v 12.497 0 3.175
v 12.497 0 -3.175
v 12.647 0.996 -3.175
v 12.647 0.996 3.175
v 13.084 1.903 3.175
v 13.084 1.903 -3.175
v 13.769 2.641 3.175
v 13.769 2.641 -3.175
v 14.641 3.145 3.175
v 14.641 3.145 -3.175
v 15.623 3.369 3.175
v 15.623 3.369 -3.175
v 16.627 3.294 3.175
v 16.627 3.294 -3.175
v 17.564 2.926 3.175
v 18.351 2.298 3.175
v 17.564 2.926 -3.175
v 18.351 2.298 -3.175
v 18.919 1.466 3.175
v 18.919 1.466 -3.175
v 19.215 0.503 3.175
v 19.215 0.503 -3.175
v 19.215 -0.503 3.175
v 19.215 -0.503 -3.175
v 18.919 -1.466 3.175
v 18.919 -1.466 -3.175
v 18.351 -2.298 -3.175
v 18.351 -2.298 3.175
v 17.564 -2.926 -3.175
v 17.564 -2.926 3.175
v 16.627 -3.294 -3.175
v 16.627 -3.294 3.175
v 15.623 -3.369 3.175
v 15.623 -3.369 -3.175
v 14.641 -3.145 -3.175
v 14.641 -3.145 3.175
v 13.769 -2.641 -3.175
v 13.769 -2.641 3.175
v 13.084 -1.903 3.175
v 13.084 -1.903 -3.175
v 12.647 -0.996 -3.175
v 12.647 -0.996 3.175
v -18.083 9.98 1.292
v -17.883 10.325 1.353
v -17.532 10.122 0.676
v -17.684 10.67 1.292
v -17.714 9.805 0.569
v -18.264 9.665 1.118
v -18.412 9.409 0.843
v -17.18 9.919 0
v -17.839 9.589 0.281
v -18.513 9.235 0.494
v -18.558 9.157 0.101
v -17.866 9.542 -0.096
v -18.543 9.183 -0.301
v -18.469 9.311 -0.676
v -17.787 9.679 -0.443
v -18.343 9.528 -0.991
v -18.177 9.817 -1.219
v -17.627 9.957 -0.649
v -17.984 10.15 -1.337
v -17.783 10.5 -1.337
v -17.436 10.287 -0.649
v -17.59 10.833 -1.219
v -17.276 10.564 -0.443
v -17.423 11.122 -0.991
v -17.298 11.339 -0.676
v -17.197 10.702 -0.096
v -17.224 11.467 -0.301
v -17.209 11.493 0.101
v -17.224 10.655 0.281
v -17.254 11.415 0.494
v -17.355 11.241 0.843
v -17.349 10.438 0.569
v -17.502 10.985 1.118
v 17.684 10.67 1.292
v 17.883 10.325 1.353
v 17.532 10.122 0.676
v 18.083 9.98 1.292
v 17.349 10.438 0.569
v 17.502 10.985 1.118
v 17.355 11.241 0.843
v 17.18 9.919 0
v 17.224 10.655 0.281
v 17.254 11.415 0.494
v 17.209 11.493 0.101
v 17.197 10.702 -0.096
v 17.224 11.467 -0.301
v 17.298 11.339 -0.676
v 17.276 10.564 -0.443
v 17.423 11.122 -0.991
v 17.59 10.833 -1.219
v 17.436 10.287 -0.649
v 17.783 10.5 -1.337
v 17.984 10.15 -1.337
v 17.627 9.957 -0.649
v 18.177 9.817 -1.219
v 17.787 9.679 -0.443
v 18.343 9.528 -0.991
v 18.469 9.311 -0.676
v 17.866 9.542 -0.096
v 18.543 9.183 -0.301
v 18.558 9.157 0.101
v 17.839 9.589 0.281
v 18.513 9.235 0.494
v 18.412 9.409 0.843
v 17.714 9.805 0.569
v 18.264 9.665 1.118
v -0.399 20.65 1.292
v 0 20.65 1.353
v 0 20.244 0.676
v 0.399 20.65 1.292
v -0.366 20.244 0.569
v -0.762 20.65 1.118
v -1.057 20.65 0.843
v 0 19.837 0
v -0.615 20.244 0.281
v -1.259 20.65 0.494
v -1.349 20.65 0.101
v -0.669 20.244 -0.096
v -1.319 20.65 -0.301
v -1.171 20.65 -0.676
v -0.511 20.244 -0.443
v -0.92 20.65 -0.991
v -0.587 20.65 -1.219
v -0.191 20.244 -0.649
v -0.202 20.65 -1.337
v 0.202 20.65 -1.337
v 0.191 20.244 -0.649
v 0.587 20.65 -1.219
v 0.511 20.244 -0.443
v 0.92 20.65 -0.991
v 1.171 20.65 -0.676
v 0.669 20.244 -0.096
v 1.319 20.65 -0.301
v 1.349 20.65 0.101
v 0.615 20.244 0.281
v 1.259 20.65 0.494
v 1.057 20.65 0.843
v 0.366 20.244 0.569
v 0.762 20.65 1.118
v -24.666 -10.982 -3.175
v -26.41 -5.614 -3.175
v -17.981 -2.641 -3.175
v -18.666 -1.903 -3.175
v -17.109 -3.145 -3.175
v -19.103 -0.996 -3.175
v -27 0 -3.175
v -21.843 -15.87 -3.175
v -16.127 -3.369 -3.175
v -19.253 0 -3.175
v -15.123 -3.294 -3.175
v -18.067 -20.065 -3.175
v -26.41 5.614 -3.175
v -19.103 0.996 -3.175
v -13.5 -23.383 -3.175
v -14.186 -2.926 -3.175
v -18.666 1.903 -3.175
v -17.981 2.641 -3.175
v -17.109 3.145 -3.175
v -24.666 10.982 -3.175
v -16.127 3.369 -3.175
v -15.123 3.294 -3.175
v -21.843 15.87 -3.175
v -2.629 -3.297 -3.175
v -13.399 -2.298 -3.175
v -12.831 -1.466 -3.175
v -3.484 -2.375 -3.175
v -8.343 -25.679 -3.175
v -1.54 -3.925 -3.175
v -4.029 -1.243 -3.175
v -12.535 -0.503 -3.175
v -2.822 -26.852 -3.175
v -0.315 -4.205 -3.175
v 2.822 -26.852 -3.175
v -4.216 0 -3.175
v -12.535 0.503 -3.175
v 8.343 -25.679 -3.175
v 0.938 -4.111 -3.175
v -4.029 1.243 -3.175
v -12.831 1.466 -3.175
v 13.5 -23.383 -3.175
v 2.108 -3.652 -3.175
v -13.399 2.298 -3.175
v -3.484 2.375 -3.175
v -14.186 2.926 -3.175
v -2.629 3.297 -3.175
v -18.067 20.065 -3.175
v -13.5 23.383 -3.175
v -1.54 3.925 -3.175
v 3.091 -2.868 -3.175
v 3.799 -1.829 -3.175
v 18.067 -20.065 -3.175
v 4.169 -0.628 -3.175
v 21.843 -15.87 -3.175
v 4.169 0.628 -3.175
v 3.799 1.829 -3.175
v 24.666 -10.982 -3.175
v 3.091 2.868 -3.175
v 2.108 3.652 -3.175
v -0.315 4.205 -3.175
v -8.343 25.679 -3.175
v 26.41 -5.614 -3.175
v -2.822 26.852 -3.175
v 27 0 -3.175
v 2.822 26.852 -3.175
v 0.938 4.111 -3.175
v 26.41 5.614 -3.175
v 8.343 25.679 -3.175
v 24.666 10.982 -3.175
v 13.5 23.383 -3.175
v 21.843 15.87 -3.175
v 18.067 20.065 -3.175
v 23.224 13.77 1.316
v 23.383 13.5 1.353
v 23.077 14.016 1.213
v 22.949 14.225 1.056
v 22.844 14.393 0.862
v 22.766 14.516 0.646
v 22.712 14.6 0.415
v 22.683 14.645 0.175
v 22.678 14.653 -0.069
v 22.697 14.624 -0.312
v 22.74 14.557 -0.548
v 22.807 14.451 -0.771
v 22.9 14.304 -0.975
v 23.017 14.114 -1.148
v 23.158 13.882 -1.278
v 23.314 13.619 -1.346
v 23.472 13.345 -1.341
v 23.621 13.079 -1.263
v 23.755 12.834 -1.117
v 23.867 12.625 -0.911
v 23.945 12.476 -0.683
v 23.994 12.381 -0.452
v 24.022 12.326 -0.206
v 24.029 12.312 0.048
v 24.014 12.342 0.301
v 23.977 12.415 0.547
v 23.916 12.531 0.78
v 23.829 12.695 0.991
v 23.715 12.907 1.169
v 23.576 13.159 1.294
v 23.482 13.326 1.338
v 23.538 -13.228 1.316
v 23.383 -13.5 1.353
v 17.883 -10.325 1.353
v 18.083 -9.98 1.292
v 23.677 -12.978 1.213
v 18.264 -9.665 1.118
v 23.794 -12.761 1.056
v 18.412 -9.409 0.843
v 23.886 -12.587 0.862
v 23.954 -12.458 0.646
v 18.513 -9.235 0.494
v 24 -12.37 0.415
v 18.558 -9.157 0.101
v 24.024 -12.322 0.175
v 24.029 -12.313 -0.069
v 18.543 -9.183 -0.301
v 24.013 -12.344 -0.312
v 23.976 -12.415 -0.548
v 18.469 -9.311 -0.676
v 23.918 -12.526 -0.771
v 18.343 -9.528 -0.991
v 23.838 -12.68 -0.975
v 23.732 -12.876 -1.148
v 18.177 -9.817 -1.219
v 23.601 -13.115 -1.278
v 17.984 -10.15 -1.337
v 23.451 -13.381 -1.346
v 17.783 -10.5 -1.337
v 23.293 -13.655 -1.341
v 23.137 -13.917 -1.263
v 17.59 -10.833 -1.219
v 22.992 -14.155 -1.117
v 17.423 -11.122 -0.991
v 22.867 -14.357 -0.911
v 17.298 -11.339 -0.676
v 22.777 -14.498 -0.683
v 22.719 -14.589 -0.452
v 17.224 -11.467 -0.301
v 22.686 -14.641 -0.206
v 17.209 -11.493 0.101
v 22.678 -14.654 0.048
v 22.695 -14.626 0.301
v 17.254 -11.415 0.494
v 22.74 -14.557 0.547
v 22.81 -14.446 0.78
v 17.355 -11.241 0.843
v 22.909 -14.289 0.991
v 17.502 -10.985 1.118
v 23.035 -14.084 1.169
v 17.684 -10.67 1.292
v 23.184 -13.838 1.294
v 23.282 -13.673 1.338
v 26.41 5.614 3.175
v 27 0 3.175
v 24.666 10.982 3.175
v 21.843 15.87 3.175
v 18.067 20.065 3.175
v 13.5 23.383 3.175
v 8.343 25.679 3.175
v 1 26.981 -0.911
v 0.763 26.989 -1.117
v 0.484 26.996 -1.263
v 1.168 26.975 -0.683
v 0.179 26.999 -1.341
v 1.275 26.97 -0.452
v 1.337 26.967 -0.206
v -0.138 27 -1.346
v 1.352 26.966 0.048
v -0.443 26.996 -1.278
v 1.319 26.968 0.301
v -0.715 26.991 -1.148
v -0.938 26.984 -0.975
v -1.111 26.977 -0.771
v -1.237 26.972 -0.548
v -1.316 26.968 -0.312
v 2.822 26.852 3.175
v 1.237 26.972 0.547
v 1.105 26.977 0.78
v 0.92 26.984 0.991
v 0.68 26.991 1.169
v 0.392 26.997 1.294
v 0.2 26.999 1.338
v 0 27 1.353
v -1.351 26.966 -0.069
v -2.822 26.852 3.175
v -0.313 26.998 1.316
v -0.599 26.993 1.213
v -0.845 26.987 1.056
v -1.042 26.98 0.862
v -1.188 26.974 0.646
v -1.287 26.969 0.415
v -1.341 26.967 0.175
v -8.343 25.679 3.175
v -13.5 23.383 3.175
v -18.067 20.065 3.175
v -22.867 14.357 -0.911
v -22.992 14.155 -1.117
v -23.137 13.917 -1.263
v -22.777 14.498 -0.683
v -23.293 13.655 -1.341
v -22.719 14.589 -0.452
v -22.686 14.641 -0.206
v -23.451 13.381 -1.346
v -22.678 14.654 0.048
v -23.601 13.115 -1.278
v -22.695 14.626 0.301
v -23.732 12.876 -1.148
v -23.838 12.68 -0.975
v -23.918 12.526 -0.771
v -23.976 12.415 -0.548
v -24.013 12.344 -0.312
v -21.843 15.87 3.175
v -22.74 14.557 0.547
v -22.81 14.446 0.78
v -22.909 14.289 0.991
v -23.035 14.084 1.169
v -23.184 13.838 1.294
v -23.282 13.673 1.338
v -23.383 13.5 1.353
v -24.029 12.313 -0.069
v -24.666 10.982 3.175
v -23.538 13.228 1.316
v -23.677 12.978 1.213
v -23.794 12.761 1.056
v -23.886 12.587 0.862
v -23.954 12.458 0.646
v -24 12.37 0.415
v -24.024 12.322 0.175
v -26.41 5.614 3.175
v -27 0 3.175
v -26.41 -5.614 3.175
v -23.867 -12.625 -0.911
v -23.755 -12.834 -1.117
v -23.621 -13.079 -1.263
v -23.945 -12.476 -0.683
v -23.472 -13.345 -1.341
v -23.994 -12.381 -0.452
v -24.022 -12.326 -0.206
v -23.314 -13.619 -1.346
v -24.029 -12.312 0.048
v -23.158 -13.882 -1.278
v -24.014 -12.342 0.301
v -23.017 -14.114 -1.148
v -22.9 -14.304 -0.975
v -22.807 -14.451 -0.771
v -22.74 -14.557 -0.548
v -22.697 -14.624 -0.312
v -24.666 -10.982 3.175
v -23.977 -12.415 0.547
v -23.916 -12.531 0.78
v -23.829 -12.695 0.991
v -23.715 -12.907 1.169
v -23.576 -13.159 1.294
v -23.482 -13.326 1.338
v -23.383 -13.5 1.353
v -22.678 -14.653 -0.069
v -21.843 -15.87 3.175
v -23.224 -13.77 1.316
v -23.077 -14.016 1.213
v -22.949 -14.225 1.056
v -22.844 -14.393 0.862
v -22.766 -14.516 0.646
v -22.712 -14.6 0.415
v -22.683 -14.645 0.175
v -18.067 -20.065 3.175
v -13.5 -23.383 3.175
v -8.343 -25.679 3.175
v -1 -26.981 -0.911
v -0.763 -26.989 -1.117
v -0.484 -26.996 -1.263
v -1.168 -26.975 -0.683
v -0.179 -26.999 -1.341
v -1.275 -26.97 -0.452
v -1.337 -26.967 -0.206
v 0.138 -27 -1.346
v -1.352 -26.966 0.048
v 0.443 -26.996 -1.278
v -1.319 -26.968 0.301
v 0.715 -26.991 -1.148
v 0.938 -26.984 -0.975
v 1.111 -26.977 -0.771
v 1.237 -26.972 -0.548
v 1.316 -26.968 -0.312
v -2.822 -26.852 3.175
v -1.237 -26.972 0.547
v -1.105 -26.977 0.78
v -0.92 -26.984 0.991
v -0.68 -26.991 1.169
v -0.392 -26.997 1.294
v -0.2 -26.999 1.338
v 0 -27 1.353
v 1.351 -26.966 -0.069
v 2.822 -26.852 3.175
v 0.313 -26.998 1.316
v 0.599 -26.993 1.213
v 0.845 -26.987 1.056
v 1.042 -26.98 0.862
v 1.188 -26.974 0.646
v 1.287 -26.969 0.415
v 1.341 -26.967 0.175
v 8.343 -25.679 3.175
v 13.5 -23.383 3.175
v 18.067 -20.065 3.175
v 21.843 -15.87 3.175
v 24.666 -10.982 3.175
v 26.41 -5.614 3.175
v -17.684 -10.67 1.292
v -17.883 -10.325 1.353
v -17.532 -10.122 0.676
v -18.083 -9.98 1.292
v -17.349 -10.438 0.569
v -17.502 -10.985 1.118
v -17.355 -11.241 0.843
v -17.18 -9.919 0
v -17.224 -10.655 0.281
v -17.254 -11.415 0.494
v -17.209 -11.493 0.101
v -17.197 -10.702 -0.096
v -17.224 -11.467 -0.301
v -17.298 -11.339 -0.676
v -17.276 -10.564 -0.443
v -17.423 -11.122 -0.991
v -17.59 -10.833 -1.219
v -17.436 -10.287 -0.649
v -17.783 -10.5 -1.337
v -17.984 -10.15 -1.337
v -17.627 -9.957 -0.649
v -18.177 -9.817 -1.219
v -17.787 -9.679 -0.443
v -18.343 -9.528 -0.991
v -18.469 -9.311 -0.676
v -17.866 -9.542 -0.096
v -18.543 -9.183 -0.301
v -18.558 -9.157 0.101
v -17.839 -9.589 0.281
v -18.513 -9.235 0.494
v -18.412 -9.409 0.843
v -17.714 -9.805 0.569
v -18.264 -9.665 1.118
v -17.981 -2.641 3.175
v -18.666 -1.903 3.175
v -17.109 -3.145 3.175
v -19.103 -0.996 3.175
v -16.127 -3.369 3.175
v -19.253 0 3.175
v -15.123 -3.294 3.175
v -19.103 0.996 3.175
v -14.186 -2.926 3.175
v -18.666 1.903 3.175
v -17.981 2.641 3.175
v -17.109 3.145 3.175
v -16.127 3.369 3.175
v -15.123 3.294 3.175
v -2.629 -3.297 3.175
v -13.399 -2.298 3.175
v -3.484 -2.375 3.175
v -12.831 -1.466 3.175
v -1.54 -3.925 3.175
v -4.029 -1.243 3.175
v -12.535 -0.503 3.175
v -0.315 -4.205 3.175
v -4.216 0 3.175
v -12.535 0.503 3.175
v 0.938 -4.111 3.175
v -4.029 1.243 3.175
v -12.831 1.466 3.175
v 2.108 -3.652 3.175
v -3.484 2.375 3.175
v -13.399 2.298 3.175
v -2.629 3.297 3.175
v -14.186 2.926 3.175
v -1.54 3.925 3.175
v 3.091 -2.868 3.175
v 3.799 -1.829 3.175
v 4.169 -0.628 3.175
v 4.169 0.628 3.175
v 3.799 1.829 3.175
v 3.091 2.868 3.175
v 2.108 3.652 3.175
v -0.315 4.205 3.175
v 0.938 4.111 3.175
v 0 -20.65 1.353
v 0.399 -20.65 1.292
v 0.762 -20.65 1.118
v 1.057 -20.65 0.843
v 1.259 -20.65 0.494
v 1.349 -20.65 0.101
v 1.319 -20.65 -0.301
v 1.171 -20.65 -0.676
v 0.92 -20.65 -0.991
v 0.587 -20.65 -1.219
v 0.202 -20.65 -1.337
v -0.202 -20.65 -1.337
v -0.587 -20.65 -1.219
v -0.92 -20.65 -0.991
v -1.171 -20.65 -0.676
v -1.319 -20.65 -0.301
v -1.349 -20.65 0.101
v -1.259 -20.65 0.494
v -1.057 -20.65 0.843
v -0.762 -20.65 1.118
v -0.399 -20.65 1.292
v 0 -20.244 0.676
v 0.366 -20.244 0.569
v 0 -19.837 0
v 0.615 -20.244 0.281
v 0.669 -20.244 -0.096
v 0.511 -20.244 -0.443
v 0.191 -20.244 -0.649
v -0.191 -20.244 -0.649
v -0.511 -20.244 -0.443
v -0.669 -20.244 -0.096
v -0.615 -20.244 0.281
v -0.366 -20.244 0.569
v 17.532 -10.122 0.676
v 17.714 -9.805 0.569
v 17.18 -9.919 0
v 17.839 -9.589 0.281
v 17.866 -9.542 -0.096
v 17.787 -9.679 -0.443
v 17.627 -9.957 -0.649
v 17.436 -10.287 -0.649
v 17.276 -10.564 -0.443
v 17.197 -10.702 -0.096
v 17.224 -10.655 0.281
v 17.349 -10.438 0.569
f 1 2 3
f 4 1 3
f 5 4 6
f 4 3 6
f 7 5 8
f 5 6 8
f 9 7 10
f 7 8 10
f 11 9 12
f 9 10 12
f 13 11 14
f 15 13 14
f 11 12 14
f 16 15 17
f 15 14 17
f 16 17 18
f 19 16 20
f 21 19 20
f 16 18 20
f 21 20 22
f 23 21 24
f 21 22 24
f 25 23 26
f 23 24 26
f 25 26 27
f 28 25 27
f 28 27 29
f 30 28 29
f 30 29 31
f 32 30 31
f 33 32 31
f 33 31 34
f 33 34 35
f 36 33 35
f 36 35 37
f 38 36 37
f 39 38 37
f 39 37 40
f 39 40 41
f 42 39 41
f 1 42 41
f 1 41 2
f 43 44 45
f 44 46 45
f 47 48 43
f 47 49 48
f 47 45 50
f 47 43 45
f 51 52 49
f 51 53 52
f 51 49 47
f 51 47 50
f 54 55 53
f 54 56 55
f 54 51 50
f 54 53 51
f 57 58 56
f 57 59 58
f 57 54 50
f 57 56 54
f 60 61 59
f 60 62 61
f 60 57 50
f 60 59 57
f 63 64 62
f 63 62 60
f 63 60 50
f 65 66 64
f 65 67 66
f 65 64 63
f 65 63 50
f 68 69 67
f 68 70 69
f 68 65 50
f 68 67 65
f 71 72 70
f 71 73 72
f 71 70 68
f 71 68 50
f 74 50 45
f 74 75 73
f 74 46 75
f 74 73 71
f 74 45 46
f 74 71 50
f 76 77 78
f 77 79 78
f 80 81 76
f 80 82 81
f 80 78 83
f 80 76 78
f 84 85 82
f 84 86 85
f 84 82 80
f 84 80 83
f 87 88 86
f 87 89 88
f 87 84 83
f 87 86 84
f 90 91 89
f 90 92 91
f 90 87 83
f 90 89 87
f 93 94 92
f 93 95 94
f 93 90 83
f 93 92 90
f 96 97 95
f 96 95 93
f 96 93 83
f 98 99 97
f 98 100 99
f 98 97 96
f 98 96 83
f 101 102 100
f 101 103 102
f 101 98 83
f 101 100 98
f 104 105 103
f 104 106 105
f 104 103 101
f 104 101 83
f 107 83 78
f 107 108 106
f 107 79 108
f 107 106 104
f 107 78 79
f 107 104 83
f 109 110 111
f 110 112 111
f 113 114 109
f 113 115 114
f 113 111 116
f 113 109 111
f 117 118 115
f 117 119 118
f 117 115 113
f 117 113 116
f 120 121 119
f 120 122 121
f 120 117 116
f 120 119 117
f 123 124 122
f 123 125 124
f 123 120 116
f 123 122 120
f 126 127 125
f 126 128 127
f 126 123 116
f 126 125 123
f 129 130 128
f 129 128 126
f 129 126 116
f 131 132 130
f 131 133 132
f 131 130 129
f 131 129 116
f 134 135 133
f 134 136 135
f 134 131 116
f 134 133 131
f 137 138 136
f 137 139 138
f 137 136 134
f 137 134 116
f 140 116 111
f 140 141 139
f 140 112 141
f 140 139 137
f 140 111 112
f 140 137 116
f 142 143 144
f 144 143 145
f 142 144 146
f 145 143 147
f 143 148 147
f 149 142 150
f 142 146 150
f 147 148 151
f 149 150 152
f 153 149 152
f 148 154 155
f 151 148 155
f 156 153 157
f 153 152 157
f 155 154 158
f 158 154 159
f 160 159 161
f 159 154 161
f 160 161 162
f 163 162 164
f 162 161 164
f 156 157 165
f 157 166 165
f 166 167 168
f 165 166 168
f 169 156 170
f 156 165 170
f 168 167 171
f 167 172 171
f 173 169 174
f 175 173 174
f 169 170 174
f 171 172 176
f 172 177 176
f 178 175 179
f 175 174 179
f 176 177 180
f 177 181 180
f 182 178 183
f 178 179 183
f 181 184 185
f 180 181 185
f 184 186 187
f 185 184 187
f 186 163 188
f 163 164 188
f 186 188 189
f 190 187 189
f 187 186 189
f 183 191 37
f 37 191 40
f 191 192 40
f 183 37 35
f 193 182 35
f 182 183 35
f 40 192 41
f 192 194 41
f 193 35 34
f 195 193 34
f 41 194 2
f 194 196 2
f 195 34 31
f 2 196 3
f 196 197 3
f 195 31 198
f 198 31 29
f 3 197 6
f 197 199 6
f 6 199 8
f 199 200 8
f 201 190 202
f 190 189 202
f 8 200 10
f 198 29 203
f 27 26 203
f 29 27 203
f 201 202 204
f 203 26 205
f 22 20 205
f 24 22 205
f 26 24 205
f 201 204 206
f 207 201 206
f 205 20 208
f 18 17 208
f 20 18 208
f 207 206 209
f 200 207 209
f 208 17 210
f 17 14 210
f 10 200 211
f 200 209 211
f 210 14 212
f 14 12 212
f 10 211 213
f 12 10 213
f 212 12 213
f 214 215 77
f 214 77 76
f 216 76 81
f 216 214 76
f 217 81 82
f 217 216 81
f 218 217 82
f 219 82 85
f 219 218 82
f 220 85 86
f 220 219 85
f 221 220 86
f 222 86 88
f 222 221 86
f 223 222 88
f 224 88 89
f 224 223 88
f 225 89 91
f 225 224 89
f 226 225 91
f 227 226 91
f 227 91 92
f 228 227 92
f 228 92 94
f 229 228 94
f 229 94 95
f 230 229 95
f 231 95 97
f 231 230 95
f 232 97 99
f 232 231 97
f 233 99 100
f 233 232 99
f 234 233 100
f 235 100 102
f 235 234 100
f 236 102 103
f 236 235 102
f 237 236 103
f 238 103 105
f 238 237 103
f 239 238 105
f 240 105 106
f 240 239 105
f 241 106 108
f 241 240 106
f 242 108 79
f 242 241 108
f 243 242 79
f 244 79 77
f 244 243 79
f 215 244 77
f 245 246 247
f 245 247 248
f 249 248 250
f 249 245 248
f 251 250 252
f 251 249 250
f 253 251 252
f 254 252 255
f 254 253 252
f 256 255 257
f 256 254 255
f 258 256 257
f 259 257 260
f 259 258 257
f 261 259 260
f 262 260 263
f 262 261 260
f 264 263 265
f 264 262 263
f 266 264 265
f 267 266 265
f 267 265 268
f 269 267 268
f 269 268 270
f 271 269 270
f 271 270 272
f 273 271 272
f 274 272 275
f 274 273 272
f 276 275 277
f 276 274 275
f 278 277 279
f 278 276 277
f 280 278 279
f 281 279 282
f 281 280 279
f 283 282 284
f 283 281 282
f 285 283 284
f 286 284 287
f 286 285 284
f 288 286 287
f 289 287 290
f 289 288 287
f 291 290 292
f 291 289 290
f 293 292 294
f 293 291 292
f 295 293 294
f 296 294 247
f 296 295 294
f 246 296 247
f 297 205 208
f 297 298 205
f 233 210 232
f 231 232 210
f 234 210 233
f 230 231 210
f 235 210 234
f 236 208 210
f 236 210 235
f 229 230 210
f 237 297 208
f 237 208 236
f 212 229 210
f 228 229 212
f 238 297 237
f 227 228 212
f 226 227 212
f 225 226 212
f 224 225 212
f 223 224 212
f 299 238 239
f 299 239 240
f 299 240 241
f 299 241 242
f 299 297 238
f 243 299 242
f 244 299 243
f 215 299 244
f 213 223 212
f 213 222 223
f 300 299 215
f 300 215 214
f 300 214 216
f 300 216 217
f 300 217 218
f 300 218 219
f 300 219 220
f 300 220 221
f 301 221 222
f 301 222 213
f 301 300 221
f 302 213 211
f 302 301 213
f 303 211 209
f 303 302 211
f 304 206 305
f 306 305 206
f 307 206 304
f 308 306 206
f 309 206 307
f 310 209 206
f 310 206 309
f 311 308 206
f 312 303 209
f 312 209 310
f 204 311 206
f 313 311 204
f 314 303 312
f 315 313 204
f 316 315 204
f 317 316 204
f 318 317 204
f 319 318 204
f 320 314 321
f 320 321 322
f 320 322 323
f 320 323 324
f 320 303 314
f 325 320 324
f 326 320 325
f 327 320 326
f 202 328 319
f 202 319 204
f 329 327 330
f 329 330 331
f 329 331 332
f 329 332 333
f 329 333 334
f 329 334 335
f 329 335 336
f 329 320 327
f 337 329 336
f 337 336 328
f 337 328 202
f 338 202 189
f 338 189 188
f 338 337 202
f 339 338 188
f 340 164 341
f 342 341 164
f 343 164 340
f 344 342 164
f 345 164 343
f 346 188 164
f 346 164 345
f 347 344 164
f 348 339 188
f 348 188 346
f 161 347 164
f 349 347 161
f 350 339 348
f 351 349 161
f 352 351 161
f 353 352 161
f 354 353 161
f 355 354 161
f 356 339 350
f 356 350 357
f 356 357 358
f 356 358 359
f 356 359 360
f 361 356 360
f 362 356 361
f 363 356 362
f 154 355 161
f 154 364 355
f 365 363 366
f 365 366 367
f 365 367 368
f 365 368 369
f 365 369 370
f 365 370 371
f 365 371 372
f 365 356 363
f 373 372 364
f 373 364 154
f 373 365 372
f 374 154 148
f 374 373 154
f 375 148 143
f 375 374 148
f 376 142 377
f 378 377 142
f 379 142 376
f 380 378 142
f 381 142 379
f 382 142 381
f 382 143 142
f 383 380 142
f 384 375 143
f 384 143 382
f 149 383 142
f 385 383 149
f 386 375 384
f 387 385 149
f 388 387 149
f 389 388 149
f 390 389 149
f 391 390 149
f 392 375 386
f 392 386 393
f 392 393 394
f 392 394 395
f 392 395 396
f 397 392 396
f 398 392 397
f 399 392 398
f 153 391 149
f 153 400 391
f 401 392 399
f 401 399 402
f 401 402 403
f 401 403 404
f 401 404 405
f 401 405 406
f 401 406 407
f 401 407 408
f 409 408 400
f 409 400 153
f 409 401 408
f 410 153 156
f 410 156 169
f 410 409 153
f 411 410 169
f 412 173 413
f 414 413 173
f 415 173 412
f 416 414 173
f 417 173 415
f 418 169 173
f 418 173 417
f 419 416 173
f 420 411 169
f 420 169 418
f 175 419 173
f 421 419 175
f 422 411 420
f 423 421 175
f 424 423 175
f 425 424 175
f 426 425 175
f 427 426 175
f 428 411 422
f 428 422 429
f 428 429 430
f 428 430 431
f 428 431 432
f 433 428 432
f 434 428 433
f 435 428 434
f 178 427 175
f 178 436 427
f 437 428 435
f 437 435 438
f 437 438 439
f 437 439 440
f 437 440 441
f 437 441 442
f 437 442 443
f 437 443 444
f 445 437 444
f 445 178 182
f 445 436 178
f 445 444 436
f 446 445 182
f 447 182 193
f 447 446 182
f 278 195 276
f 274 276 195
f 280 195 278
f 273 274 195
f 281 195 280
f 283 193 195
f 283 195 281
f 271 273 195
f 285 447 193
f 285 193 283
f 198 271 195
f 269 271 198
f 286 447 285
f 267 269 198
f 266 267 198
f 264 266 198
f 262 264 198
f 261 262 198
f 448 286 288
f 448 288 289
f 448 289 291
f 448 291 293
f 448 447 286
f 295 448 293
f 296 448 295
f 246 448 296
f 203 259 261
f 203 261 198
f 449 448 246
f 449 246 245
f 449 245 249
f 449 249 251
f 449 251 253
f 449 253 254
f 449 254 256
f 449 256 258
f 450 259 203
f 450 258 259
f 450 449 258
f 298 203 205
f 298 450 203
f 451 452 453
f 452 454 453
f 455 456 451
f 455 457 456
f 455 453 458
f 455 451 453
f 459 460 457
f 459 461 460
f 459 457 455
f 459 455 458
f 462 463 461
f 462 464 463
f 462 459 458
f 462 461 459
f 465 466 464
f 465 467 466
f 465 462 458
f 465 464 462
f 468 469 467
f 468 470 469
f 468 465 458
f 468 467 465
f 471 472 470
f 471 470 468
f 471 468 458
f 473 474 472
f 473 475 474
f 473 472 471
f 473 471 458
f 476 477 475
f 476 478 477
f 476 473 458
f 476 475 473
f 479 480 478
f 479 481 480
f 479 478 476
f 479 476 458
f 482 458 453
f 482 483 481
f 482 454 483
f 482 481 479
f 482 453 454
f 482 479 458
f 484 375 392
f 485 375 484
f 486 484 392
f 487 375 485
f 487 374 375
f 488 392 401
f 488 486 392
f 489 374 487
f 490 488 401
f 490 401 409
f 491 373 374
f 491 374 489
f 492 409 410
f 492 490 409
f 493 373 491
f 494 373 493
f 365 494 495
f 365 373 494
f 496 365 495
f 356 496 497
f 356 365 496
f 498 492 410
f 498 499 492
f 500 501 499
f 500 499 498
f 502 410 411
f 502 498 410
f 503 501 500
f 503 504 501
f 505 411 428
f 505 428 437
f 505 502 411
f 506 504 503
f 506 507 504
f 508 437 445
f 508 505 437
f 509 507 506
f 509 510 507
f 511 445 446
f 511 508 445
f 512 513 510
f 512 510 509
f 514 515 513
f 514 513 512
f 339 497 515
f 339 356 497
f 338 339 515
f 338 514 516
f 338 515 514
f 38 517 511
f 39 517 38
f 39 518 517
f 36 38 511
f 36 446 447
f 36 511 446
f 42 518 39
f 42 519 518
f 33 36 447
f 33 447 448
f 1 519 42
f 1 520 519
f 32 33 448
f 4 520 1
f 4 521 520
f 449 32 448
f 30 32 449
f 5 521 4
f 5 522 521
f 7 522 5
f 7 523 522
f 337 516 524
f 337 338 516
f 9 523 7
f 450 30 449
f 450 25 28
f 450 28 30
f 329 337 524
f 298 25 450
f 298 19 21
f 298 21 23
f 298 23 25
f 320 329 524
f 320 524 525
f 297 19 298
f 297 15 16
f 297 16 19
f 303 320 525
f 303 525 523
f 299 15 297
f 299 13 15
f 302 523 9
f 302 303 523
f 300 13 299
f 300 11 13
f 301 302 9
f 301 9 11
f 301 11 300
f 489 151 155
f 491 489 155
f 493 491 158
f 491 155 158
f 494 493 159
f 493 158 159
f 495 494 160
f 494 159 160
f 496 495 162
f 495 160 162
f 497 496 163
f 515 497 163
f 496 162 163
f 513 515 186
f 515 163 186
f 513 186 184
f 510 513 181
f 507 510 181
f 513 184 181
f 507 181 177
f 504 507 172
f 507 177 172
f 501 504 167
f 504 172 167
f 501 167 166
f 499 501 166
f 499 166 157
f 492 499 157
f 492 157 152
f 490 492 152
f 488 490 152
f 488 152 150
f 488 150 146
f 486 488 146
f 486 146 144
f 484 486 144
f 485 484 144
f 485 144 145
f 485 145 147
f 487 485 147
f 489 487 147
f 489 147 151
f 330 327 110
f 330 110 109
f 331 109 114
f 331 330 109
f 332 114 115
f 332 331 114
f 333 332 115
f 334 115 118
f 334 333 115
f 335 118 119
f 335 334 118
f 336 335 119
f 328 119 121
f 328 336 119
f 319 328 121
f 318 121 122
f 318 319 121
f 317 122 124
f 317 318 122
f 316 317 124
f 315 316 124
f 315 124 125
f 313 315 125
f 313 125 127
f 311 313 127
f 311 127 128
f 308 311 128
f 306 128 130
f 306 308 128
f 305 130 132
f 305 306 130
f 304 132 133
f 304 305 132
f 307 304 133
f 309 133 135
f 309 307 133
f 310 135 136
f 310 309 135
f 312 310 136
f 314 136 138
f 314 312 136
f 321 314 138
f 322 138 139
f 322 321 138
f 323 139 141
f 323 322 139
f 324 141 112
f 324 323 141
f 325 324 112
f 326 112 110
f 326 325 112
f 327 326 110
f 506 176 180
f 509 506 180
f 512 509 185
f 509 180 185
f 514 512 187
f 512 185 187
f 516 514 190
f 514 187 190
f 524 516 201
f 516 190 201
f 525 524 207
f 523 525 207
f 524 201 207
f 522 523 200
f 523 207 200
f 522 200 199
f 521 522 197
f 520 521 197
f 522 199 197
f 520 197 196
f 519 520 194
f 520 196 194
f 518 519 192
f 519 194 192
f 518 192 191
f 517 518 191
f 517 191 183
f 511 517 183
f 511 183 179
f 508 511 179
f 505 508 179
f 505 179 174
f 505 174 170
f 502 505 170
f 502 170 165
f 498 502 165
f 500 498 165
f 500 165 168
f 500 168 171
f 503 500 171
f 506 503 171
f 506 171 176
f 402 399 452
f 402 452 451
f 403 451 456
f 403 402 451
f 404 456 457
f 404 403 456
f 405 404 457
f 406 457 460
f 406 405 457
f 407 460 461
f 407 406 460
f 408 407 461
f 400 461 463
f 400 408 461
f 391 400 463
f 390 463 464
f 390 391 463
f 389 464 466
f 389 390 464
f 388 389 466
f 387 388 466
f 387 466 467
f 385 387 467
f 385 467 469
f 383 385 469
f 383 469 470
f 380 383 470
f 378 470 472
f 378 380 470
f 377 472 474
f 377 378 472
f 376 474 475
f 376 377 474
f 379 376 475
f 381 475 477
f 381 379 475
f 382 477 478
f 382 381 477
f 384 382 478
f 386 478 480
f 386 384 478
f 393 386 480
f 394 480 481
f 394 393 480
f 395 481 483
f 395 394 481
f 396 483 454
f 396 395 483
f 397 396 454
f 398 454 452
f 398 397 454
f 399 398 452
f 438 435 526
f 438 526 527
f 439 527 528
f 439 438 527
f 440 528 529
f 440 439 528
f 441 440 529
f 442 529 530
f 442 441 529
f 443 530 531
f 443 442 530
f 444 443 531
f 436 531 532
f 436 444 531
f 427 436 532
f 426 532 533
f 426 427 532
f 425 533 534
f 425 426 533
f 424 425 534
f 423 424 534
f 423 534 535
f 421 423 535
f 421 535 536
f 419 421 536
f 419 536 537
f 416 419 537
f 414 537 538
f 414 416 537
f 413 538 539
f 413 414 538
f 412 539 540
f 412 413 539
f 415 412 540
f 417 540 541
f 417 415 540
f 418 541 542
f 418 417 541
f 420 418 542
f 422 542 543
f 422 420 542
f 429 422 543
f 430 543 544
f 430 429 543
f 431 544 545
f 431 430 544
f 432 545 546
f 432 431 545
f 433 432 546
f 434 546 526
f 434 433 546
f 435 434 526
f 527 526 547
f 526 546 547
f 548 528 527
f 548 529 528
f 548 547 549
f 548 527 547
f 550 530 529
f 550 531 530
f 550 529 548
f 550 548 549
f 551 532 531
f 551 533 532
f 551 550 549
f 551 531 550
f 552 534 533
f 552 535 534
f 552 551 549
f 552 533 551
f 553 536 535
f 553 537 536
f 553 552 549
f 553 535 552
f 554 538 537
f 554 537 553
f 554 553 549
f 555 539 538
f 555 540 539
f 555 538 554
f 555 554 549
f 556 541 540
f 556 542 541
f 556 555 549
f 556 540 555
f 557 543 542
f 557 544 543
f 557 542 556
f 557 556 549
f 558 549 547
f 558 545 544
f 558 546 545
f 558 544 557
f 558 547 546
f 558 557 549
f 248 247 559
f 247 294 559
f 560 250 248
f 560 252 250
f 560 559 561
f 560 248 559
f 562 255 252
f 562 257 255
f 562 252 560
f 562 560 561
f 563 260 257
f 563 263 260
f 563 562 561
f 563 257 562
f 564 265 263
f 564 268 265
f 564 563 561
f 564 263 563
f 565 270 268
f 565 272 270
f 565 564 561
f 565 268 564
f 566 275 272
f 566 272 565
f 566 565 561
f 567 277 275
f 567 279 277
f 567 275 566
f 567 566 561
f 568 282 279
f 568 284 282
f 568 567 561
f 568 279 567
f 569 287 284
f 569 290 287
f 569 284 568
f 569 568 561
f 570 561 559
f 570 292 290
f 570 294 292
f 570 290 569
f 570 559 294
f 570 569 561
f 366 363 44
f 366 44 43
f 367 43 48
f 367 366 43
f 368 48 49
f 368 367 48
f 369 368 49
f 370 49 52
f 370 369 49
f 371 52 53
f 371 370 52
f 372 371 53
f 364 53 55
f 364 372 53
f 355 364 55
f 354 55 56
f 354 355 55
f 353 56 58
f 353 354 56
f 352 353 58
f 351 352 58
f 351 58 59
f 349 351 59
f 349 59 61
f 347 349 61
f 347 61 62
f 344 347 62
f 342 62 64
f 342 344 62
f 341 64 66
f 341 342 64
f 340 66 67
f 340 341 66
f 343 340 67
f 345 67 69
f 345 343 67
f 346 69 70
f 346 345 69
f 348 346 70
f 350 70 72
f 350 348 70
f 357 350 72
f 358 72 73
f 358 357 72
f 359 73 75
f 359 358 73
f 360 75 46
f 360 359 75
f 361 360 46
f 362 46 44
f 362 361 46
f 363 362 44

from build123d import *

# Parameters (mm, degrees)
SKETCH2_R                = 27
BOSS_EXTRUDE1_DEPTH      = 3.175
F_5_16_CLEARANCE_HOLE1_D = 8.4328
F_1_4_CLEARANCE_HOLE1_D  = 6.7564
CIRPATTERN1_COUNT        = 6


with BuildPart() as part:
    # Sketch2 → Boss-Extrude1 (new body, symmetric)
    with BuildSketch(Plane.XY):
        Circle(SKETCH2_R)
    extrude(amount=BOSS_EXTRUDE1_DEPTH, both=True)

    # 5/16 Clearance Hole1 (through all)
    with Locations(Plane.XY.offset(3.175)):
        with Locations((0, 0)):
            Hole(F_5_16_CLEARANCE_HOLE1_D / 2)

    # 1/4 Clearance Hole1 (through all)
    with Locations(Plane.XY.offset(3.175)):
        with Locations((-15.875, 0), (15.875, 0)):
            Hole(F_1_4_CLEARANCE_HOLE1_D / 2)

    # Sketch9 → Tap Drill for #6-32 Tap1 (revolve, cut)
    with BuildSketch(Plane(origin=(0, 27, 0), x_dir=(0, 0, 1), z_dir=(1, 0, 0))):
        Polygon((0, 0), (0, 7.16269403), (1.35255, 6.35), (1.35255, 0), align=None)
    tap_drill_for_6_32_tap1 = revolve(axis=Axis((0, 33.35, 0), (0, -1, 0)), mode=Mode.SUBTRACT)

    # CirPattern1: Tap Drill for #6-32 Tap1 ×6 about axis
    cirpattern1_axis = Axis((0, 0, 3.175), (0, 0, 1))
    for i in range(1, CIRPATTERN1_COUNT):
        add(tap_drill_for_6_32_tap1.rotate(cirpattern1_axis, i * 360 / CIRPATTERN1_COUNT), mode=Mode.SUBTRACT)


solid = part.part
